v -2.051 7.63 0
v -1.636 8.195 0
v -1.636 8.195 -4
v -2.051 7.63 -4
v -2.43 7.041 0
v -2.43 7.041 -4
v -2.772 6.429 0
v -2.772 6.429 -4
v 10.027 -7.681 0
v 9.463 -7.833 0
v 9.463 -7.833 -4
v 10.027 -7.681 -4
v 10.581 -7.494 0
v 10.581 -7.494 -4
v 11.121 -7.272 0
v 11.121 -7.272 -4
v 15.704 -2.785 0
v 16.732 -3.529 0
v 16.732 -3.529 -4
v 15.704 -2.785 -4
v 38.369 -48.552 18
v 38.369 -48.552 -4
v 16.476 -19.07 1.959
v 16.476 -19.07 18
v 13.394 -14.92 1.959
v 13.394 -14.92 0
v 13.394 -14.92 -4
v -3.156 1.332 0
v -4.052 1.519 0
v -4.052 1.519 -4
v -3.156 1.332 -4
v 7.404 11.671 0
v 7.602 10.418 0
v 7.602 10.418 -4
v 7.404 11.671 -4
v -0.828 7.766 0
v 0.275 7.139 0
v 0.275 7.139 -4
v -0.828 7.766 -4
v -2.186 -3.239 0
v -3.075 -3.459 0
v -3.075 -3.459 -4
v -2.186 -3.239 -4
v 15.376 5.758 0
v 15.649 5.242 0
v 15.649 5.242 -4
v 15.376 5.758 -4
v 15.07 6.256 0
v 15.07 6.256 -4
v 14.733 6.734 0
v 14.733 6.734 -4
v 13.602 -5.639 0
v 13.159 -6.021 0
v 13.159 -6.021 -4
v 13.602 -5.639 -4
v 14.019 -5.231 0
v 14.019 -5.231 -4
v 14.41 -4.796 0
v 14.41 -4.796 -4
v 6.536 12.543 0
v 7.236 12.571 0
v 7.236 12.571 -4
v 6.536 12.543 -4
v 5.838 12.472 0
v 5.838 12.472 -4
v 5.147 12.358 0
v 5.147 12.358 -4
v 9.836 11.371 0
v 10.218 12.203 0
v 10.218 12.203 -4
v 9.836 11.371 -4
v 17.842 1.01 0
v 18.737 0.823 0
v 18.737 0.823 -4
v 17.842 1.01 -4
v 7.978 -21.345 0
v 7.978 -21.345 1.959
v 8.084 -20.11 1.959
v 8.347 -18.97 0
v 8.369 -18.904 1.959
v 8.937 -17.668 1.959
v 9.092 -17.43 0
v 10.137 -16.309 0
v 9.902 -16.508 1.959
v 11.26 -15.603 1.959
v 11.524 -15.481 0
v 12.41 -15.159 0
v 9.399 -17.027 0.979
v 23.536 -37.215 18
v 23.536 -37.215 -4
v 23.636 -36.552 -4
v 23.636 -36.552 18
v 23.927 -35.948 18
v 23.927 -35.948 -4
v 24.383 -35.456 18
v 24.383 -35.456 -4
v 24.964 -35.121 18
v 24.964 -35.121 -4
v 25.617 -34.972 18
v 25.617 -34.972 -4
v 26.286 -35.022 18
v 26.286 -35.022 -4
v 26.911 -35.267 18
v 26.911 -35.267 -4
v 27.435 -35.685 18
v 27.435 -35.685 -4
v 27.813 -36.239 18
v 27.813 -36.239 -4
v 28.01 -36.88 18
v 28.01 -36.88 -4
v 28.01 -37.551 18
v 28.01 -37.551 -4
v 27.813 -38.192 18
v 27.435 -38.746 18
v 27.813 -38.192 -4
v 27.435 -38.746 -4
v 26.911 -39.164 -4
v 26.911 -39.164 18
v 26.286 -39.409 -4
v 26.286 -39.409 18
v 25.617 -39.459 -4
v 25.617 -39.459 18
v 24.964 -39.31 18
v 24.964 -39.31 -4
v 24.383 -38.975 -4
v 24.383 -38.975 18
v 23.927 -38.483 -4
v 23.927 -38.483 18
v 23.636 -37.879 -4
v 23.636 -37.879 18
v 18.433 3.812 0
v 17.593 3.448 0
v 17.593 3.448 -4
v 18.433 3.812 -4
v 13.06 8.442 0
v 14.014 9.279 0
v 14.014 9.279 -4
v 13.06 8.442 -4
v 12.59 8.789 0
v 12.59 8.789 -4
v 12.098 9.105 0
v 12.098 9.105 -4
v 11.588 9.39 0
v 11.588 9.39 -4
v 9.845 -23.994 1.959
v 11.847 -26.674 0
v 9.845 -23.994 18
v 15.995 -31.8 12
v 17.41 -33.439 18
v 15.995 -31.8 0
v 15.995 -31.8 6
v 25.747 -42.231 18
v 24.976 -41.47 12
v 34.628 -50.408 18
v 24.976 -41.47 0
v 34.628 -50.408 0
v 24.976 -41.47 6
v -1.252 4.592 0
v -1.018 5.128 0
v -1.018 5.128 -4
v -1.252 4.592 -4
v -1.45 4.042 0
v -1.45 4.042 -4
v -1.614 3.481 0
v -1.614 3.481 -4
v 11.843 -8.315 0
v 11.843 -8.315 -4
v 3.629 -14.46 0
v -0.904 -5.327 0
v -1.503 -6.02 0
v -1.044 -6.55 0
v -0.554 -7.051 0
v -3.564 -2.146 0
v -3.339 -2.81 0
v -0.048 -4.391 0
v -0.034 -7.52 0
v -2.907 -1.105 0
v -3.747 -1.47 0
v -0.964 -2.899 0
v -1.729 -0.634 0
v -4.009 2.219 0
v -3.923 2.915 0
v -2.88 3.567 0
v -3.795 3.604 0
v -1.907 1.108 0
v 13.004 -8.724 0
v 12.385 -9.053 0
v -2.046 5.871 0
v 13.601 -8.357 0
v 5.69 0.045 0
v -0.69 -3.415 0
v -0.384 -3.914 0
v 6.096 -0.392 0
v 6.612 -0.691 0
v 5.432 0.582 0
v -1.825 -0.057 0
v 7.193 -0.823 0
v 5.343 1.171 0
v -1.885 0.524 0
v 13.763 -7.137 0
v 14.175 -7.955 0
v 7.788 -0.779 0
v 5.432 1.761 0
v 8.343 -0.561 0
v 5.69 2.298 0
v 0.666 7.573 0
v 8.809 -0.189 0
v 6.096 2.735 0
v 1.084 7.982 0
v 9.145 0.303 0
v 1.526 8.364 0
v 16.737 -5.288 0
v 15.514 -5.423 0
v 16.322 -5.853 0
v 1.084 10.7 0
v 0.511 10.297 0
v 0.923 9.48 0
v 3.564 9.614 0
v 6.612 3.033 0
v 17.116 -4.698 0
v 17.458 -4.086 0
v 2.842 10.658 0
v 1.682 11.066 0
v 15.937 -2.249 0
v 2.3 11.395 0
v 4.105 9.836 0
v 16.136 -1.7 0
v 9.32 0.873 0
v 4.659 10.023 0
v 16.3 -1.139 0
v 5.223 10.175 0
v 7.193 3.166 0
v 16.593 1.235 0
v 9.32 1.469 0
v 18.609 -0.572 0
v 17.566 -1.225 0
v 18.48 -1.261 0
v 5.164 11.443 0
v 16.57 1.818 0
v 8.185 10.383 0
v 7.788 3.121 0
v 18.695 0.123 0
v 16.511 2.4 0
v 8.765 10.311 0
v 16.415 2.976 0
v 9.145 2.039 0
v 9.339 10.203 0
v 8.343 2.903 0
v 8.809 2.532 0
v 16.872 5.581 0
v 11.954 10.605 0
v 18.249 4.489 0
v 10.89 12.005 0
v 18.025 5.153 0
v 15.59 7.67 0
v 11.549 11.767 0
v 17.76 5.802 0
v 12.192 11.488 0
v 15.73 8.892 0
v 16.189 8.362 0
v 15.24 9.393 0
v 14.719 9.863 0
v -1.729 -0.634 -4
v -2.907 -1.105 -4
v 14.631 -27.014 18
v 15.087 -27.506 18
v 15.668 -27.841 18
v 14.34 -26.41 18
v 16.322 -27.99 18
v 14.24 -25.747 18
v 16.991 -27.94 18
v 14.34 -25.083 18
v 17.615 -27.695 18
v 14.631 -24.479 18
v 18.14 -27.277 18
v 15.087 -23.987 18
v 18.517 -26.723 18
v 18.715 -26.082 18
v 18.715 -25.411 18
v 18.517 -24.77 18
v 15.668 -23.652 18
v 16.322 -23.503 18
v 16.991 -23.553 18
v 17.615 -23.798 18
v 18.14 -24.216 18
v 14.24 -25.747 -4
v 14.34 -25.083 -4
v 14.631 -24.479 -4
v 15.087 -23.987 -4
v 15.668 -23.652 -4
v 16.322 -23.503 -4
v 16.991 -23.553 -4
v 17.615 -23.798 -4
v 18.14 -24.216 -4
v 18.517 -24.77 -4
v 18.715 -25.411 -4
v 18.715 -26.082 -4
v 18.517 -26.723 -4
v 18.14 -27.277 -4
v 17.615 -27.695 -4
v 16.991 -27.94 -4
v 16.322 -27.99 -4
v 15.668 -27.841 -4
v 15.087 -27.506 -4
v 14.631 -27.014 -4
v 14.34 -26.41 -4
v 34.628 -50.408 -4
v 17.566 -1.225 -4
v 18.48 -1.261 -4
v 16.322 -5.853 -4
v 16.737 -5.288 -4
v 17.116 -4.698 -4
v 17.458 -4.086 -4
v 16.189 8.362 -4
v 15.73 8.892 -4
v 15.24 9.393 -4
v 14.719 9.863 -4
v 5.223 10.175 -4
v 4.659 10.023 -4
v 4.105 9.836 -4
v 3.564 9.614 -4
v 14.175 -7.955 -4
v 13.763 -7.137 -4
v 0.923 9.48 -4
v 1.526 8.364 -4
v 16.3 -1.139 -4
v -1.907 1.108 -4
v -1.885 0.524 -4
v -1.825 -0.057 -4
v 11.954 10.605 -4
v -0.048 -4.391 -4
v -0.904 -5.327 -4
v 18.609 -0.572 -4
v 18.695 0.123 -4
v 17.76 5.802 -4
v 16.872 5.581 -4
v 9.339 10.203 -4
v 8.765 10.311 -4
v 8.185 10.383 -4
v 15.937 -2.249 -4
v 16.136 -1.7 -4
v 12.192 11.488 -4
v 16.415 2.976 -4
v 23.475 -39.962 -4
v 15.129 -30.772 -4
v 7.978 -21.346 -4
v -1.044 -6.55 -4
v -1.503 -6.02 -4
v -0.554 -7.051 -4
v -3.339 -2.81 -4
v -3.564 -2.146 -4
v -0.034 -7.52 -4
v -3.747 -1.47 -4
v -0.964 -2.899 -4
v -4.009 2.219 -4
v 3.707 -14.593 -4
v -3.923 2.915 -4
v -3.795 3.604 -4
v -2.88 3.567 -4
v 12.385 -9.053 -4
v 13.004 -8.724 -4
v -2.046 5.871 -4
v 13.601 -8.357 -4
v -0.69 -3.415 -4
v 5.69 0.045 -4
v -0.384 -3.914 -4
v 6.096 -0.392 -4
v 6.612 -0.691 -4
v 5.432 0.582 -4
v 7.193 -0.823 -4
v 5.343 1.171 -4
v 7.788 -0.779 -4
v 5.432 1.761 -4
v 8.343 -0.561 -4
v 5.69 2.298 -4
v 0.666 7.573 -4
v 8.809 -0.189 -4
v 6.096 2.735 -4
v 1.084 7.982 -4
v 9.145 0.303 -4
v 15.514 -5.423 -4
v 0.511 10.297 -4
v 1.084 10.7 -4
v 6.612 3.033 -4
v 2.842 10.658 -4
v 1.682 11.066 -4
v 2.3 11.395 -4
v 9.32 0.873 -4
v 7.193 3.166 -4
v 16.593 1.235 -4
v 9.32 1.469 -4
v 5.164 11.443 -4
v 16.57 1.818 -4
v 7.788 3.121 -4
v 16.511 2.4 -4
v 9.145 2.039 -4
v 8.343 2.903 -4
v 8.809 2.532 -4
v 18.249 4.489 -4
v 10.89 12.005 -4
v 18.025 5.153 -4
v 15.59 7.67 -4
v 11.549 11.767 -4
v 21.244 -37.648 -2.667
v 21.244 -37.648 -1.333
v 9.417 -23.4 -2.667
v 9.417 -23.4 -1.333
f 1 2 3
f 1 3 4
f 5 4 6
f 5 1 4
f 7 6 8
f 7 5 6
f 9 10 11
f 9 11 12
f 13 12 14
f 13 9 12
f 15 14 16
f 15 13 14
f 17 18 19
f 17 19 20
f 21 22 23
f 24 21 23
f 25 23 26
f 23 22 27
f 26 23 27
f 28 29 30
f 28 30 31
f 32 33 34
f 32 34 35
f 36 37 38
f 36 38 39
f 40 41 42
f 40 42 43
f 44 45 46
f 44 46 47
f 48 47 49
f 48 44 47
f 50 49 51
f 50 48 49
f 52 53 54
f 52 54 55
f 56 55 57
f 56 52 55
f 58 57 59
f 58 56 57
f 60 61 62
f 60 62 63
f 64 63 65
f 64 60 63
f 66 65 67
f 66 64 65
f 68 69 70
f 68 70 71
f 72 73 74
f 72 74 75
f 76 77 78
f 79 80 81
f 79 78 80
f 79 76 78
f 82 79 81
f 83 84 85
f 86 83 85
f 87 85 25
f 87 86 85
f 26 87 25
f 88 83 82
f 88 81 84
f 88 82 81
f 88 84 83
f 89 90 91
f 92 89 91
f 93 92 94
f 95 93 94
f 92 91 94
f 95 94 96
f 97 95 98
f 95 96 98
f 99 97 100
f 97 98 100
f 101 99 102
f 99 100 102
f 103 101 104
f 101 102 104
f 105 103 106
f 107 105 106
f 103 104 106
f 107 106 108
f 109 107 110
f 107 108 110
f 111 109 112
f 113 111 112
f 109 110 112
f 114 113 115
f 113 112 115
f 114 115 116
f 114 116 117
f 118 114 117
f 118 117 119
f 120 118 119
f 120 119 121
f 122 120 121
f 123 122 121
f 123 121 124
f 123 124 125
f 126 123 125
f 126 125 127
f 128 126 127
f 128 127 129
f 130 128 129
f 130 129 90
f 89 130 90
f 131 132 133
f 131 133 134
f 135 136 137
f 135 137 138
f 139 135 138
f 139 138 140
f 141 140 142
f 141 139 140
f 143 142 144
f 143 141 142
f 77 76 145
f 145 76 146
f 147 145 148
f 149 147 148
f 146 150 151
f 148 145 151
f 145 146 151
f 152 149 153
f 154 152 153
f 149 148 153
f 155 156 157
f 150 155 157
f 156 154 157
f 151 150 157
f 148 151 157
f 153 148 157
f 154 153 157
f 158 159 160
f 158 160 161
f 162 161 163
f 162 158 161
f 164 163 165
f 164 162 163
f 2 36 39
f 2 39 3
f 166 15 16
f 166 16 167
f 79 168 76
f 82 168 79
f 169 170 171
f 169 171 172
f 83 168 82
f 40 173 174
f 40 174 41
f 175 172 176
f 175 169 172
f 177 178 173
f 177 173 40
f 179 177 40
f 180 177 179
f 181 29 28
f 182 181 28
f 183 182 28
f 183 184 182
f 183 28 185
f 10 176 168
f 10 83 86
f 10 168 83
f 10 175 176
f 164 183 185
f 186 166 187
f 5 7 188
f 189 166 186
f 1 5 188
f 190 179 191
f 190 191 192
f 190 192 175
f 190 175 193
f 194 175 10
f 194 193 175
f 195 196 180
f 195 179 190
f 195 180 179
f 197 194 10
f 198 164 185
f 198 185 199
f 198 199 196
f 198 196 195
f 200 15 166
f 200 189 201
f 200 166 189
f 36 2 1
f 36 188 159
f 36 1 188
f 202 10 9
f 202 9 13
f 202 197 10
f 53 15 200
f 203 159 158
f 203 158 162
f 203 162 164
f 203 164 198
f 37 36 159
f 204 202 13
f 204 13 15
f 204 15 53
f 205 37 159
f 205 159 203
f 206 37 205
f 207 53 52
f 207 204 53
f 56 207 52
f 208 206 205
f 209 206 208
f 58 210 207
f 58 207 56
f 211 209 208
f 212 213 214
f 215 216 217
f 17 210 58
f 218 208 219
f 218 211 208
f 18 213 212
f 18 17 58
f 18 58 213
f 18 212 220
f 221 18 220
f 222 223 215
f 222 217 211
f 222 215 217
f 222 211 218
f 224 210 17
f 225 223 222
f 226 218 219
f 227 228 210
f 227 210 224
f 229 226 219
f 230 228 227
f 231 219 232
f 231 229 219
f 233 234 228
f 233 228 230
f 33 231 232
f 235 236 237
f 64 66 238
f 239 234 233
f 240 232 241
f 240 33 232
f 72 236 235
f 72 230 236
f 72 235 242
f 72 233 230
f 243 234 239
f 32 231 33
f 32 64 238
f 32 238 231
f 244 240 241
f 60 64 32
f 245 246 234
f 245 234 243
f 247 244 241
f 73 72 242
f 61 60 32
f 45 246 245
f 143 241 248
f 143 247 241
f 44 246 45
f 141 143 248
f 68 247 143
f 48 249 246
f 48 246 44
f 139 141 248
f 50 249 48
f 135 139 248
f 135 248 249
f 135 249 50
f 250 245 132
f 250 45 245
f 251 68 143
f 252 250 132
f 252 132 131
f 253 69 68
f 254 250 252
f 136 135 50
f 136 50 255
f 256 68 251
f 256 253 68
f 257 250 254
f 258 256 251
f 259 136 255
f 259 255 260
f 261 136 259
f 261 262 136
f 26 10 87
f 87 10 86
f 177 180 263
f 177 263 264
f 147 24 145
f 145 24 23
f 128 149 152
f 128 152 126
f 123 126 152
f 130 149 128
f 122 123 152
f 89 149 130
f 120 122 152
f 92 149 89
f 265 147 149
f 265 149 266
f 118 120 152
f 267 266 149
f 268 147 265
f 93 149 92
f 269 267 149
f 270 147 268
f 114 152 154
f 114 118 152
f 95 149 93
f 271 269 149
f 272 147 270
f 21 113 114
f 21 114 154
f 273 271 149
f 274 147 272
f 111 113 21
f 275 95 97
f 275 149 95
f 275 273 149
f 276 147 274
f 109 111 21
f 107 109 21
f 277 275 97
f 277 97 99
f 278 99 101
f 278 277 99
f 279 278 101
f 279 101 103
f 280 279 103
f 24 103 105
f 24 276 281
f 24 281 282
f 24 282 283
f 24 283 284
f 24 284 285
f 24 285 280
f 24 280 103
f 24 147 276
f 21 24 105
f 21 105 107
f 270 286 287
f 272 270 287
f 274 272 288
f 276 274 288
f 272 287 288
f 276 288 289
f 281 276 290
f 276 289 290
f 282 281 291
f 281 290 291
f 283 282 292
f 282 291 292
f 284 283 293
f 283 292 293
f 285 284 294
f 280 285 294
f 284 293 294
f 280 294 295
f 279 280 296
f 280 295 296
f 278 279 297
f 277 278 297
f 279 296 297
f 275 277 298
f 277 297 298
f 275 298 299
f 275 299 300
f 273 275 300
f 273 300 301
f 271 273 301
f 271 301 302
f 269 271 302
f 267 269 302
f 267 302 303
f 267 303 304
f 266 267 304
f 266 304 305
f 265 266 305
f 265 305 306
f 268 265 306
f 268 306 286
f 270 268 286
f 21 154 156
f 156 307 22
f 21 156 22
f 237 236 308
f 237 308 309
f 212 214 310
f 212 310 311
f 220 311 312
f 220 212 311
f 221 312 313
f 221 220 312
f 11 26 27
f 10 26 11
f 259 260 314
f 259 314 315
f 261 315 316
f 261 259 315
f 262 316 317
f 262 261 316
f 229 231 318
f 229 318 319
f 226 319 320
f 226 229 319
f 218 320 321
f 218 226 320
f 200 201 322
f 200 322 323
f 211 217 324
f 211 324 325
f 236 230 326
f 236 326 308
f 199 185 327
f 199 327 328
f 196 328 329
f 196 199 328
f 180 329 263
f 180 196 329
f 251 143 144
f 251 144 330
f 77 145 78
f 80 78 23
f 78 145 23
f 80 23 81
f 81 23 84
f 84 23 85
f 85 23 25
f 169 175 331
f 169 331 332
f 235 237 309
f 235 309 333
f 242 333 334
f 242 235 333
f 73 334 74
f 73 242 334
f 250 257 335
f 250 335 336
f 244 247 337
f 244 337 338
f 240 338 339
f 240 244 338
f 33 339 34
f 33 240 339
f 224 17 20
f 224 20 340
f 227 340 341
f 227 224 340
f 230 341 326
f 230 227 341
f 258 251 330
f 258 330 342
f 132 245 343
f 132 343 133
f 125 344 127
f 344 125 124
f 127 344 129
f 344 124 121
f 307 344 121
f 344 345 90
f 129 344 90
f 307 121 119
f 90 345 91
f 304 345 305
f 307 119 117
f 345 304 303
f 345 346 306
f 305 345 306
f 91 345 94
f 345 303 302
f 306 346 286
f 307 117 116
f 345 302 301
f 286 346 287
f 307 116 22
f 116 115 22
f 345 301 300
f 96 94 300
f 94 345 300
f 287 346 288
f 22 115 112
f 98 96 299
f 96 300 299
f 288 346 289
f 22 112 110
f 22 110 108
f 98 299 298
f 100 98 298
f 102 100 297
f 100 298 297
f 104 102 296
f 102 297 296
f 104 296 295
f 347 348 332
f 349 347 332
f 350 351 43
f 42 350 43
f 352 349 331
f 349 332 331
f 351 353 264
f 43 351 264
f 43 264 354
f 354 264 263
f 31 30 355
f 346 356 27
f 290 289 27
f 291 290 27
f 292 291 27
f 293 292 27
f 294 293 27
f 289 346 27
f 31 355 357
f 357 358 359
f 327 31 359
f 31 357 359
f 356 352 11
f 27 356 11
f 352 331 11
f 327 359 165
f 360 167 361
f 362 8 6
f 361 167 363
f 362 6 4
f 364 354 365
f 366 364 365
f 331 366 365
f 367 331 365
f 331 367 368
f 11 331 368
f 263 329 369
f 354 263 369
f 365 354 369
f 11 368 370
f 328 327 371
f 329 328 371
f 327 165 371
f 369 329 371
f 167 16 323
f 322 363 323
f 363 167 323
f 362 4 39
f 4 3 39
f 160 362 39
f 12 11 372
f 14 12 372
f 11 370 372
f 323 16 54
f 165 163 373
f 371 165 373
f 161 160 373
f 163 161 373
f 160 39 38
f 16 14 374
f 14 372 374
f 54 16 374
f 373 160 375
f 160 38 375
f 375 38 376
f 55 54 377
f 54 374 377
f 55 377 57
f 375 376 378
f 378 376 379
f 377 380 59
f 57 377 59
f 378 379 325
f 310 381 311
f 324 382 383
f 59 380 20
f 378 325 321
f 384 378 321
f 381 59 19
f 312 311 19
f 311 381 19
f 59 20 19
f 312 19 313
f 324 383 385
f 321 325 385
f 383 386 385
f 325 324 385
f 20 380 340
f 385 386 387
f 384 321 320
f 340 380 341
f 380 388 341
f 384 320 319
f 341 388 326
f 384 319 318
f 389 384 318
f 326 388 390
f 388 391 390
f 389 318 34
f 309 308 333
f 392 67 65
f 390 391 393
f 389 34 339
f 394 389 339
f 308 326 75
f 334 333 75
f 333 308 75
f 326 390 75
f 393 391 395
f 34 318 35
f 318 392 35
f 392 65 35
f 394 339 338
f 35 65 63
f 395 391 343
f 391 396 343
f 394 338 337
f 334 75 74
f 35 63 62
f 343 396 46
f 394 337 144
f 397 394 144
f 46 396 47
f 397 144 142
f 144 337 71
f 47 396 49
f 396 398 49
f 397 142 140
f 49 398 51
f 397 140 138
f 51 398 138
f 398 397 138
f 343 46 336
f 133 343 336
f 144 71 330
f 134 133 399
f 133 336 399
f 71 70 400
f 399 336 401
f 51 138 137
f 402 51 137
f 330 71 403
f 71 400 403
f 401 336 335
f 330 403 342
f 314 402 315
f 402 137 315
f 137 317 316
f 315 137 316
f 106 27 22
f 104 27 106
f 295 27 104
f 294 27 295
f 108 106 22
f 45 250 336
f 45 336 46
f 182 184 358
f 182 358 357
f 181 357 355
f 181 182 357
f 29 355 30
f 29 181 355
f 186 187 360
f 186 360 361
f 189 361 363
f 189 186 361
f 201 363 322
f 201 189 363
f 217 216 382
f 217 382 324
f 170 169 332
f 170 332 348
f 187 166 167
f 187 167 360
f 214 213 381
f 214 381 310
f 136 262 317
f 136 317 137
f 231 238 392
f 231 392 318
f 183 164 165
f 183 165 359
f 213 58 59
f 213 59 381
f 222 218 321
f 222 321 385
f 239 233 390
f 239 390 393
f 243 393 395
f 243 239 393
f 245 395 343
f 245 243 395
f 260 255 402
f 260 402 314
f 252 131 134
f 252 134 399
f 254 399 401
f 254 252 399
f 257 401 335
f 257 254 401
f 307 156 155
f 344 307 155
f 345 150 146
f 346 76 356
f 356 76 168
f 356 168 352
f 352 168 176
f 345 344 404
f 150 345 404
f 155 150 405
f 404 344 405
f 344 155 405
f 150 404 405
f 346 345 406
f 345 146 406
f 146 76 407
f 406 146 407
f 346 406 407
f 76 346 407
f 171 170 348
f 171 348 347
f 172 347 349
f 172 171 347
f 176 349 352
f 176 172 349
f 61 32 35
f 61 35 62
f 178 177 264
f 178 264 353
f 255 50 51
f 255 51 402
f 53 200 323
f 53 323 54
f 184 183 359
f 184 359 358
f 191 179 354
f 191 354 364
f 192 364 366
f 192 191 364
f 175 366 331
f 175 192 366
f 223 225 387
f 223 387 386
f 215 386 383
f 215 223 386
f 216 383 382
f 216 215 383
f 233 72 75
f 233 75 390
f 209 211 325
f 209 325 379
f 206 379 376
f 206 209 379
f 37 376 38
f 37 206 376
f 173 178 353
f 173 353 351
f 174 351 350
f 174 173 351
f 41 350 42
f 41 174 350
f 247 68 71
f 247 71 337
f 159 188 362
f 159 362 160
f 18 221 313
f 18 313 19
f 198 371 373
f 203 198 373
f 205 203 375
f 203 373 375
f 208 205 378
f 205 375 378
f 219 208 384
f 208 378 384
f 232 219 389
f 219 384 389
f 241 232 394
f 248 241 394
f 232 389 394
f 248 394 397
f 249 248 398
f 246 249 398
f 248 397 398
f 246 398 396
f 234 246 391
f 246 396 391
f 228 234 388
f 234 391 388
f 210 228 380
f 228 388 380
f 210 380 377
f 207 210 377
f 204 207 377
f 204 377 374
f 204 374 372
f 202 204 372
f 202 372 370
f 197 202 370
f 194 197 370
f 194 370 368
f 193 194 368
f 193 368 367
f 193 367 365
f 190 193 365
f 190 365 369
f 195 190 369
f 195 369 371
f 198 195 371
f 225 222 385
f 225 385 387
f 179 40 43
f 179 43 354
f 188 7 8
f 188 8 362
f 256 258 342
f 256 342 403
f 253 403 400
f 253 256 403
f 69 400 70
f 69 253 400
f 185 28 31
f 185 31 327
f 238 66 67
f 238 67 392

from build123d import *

# Parameters (mm, degrees)
BOSS_EXTRUDE1_DEPTH = 4
BOSS_EXTRUDE3_DEPTH = 4
SKETCH6_R           = 2
CUT_EXTRUDE1_DEPTH  = 18
BOSS_EXTRUDE4_DEPTH = 18
SKETCH8_R           = 2.25
CUT_EXTRUDE2_DEPTH  = 68.060778195
SKETCH10_W          = 25.230248524
SKETCH10_H          = 17.693033904
CUT_EXTRUDE4_DEPTH  = 66.862040733


with BuildPart() as part:
    # Sketch2 → Boss-Extrude1 (new body)
    with BuildSketch(Plane.XY):
        with BuildLine():
            Line((17.593003447, 3.447921134), (18.432689254, 3.812129579))
            ThreePointArc((18.432689254, 3.812129579), (18.142308848, 4.822341152), (17.760116965, 5.801513031))
            Line((17.760116965, 5.801513031), (16.871688472, 5.581479263))
            Line((16.871688472, 5.581479263), (15.649099733, 5.241598415))
            ThreePointArc((15.649099733, 5.241598415), (15.22663553, 6.009376293), (14.733410626, 6.733729845))
            Line((14.733410626, 6.733729845), (15.590096731, 7.669855443))
            Line((15.590096731, 7.669855443), (16.188603379, 8.362321932))
            ThreePointArc((16.188603379, 8.362321932), (15.488665299, 9.146499772), (14.719475556, 9.862876308))
            Line((14.719475556, 9.862876308), (14.014498216, 9.279158058))
            Line((14.014498216, 9.279158058), (13.060452596, 8.442474621))
            ThreePointArc((13.060452596, 8.442474621), (12.346699165, 8.950918239), (11.588033655, 9.389535972))
            Line((11.588033655, 9.389535972), (11.95371149, 10.604658163))
            Line((11.95371149, 10.604658163), (12.192497398, 11.488231214))
            ThreePointArc((12.192497398, 11.488231214), (11.221632964, 11.891059284), (10.217792822, 12.202753318))
            Line((10.217792822, 12.202753318), (9.835896044, 11.370963143))
            Line((9.835896044, 11.370963143), (9.33935398, 10.203192533))
            ThreePointArc((9.33935398, 10.203192533), (8.475678941, 10.351598396), (7.601835833, 10.417606691))
            Line((7.601835833, 10.417606691), (7.404078418, 11.671055622))
            Line((7.404078418, 11.671055622), (7.235849109, 12.570732756))
            ThreePointArc((7.235849109, 12.570732756), (6.18634993, 12.512426015), (5.14668224, 12.357702722))
            Line((5.14668224, 12.357702722), (5.163505363, 11.442586867))
            Line((5.163505363, 11.442586867), (5.222813101, 10.175020376))
            ThreePointArc((5.222813101, 10.175020376), (4.380277888, 9.933994883), (3.564332526, 9.614319987))
            Line((3.564332526, 9.614319987), (2.842308143, 10.657834724))
            Line((2.842308143, 10.657834724), (2.300383494, 11.395423851))
            ThreePointArc((2.300383494, 11.395423851), (1.380115753, 10.887530665), (0.510539453, 10.297034891))
            Line((0.510539453, 10.297034891), (0.922750452, 9.479843274))
            Line((0.922750452, 9.479843274), (1.526161366, 8.363537991))
            ThreePointArc((1.526161366, 8.363537991), (0.871640411, 7.780819197), (0.275200782, 7.138776643))
            Line((0.275200782, 7.138776643), (-0.828084785, 7.765676295))
            Line((-0.828084785, 7.765676295), (-1.636369952, 8.195088843))
            ThreePointArc((-1.636369952, 8.195088843), (-2.245135941, 7.338203686), (-2.772390602, 6.42889036))
            Line((-2.772390602, 6.42889036), (-2.04643517, 5.871477804))
            Line((-2.04643517, 5.871477804), (-1.018434012, 5.12753168))
            ThreePointArc((-1.018434012, 5.12753168), (-1.355304806, 4.318534189), (-1.61410652, 3.481288379))
            Line((-1.61410652, 3.481288379), (-2.880134034, 3.567407782))
            Line((-2.880134034, 3.567407782), (-3.794688927, 3.603593329))
            ThreePointArc((-3.794688927, 3.603593329), (-3.971379595, 2.567432815), (-4.051883364, 1.519402593))
            Line((-4.051883364, 1.519402593), (-3.155967876, 1.332171491))
            Line((-3.155967876, 1.332171491), (-1.90698471, 1.107932181))
            ThreePointArc((-1.90698471, 1.107932181), (-1.859483953, 0.232887867), (-1.729388897, -0.633734398))
            Line((-1.729388897, -0.633734398), (-2.907406081, -1.105452248))
            Line((-2.907406081, -1.105452248), (-3.747091888, -1.469660694))
            ThreePointArc((-3.747091888, -1.469660694), (-3.456711482, -2.479872267), (-3.0745196, -3.459044145))
            Line((-3.0745196, -3.459044145), (-2.186091107, -3.239010378))
            Line((-2.186091107, -3.239010378), (-0.963502367, -2.899129529))
            ThreePointArc((-0.963502367, -2.899129529), (-0.541038164, -3.666907408), (-0.047813261, -4.391260959))
            Line((-0.047813261, -4.391260959), (-0.904499365, -5.327386558))
            Line((-0.904499365, -5.327386558), (-1.503006014, -6.019853046))
            ThreePointArc((-1.503006014, -6.019853046), (-0.803067933, -6.804030887), (-0.03387819, -7.520407423))
            Line((-0.03387819, -7.520407423), (0.67109915, -6.936689172))
            Line((0.67109915, -6.936689172), (1.625144769, -6.100005735))
            ThreePointArc((1.625144769, -6.100005735), (2.3388982, -6.608449353), (3.097563711, -7.047067087))
            Line((3.097563711, -7.047067087), (2.731885876, -8.262189278))
            Line((2.731885876, -8.262189278), (2.493099968, -9.145762328))
            ThreePointArc((2.493099968, -9.145762328), (3.463964401, -9.548590398), (4.467804544, -9.860284433))
            Line((4.467804544, -9.860284433), (4.849701322, -9.028494257))
            Line((4.849701322, -9.028494257), (5.346243386, -7.860723648))
            ThreePointArc((5.346243386, -7.860723648), (6.209918425, -8.009129511), (7.083761533, -8.075137806))
            Line((7.083761533, -8.075137806), (7.281518948, -9.328586736))
            Line((7.281518948, -9.328586736), (7.449748257, -10.22826387))
            ThreePointArc((7.449748257, -10.22826387), (8.499247436, -10.16995713), (9.538915126, -10.015233837))
            Line((9.538915126, -10.015233837), (9.522092003, -9.100117982))
            Line((9.522092003, -9.100117982), (9.462784265, -7.83255149))
            ThreePointArc((9.462784265, -7.83255149), (10.305319478, -7.591525998), (11.12126484, -7.271851101))
            Line((11.12126484, -7.271851101), (11.843289223, -8.315365839))
            Line((11.843289223, -8.315365839), (12.385213872, -9.052954966))
            ThreePointArc((12.385213872, -9.052954966), (13.305481612, -8.54506178), (14.175057913, -7.954566005))
            Line((14.175057913, -7.954566005), (13.762846914, -7.137374389))
            Line((13.762846914, -7.137374389), (13.159436, -6.021069105))
            ThreePointArc((13.159436, -6.021069105), (13.813956955, -5.438350311), (14.410396584, -4.796307757))
            Line((14.410396584, -4.796307757), (15.513682151, -5.42320741))
            Line((15.513682151, -5.42320741), (16.321967317, -5.852619957))
            ThreePointArc((16.321967317, -5.852619957), (16.930733307, -4.9957348), (17.457987967, -4.086421474))
            Line((17.457987967, -4.086421474), (16.732032536, -3.529008918))
            Line((16.732032536, -3.529008918), (15.704031377, -2.785062794))
            ThreePointArc((15.704031377, -2.785062794), (16.040902172, -1.976065303), (16.299703886, -1.138819493))
            Line((16.299703886, -1.138819493), (17.565731399, -1.224938896))
            Line((17.565731399, -1.224938896), (18.480286292, -1.261124443))
            ThreePointArc((18.480286292, -1.261124443), (18.656976961, -0.22496393), (18.737480729, 0.823066292))
            Line((18.737480729, 0.823066292), (17.841565242, 1.010297394))
            Line((17.841565242, 1.010297394), (16.592582076, 1.234536705))
            ThreePointArc((16.592582076, 1.234536705), (16.545081318, 2.109581019), (16.414986263, 2.976203284))
            Line((16.414986263, 2.976203284), (17.593003447, 3.447921134))
        make_face()
    extrude(amount=-BOSS_EXTRUDE1_DEPTH)

    # Sketch5 → Boss-Extrude3 (add)
    with BuildSketch(Plane.XY):
        with BuildLine():
            Line((34.627961915, -50.407866333), (38.369192873, -48.55177457))
            Line((38.369192873, -48.55177457), (13.393984011, -14.920355903))
            Line((13.393984011, -14.920355903), (9.462784265, -7.83255149))
            Line((9.462784265, -7.83255149), (0.865656202, -2.843190202))
            Line((0.865656202, -2.843190202), (-0.03387819, -7.520407423))
            add(Edge.make_bspline(
                [(34.627961915, -50.407866333), (20.737528927, -38.343464696), (7.957182105, -24.264537371), (-0.03387819, -7.520407423)],
                knots=[0, 0, 0, 0, 1, 1, 1, 1], degree=3))
        make_face()
    extrude(amount=-BOSS_EXTRUDE3_DEPTH)

    # Sketch6 → Cut-Extrude1 (cut)
    with BuildSketch(Plane(origin=(0, 0, -4), x_dir=(-1, 0, 0), z_dir=(0, 0, -1))):
        with Locations((-7.342798683, 1.171234443)):
            Circle(SKETCH6_R)
    extrude(amount=-CUT_EXTRUDE1_DEPTH, mode=Mode.SUBTRACT)

    # Sketch7 → Boss-Extrude4 (add)
    with BuildSketch(Plane.XY):
        with BuildLine():
            Line((34.627961915, -50.407866333), (38.369192873, -48.55177457))
            Line((38.369192873, -48.55177457), (13.393984011, -14.920355903))
            add(Edge.make_bspline(
                [(7.977955023, -21.345123668), (8.112113434, -15.921271934), (13.393984011, -14.920355903)],
                knots=[0, 0, 0, 1, 1, 1], degree=2))
            add(Edge.make_bspline(
                [(7.977955023, -21.345123668), (15.413845314, -32.210109704), (24.739621619, -41.819443715), (34.627961915, -50.407866333)],
                knots=[0.288118642, 0.288118642, 0.288118642, 0.288118642, 1, 1, 1, 1], degree=3))
        make_face()
    extrude(amount=BOSS_EXTRUDE4_DEPTH)

    # Sketch8 → Cut-Extrude2 (cut, through all)
    with BuildSketch(Plane(origin=(0, 0, -4), x_dir=(-1, 0, 0), z_dir=(0, 0, -1))):
        with Locations((-16.490179828, -25.746560684)):
            Circle(SKETCH8_R)
        with Locations((-25.785580409, -37.215397344)):
            Circle(SKETCH8_R)
    extrude(amount=-CUT_EXTRUDE2_DEPTH, mode=Mode.SUBTRACT)

    # Sketch10 → Cut-Extrude4 (cut, through all)
    with BuildSketch(Plane(origin=(1.491415785, 1.107548305, 0), x_dir=(0, 0, -1), z_dir=(0.8028367498889462, 0.5961989206865052, 0))):
        with Locations((-14.573721534, -16.286562524)):
            Rectangle(SKETCH10_W, SKETCH10_H)
    extrude(amount=-CUT_EXTRUDE4_DEPTH, mode=Mode.SUBTRACT)


solid = part.part
